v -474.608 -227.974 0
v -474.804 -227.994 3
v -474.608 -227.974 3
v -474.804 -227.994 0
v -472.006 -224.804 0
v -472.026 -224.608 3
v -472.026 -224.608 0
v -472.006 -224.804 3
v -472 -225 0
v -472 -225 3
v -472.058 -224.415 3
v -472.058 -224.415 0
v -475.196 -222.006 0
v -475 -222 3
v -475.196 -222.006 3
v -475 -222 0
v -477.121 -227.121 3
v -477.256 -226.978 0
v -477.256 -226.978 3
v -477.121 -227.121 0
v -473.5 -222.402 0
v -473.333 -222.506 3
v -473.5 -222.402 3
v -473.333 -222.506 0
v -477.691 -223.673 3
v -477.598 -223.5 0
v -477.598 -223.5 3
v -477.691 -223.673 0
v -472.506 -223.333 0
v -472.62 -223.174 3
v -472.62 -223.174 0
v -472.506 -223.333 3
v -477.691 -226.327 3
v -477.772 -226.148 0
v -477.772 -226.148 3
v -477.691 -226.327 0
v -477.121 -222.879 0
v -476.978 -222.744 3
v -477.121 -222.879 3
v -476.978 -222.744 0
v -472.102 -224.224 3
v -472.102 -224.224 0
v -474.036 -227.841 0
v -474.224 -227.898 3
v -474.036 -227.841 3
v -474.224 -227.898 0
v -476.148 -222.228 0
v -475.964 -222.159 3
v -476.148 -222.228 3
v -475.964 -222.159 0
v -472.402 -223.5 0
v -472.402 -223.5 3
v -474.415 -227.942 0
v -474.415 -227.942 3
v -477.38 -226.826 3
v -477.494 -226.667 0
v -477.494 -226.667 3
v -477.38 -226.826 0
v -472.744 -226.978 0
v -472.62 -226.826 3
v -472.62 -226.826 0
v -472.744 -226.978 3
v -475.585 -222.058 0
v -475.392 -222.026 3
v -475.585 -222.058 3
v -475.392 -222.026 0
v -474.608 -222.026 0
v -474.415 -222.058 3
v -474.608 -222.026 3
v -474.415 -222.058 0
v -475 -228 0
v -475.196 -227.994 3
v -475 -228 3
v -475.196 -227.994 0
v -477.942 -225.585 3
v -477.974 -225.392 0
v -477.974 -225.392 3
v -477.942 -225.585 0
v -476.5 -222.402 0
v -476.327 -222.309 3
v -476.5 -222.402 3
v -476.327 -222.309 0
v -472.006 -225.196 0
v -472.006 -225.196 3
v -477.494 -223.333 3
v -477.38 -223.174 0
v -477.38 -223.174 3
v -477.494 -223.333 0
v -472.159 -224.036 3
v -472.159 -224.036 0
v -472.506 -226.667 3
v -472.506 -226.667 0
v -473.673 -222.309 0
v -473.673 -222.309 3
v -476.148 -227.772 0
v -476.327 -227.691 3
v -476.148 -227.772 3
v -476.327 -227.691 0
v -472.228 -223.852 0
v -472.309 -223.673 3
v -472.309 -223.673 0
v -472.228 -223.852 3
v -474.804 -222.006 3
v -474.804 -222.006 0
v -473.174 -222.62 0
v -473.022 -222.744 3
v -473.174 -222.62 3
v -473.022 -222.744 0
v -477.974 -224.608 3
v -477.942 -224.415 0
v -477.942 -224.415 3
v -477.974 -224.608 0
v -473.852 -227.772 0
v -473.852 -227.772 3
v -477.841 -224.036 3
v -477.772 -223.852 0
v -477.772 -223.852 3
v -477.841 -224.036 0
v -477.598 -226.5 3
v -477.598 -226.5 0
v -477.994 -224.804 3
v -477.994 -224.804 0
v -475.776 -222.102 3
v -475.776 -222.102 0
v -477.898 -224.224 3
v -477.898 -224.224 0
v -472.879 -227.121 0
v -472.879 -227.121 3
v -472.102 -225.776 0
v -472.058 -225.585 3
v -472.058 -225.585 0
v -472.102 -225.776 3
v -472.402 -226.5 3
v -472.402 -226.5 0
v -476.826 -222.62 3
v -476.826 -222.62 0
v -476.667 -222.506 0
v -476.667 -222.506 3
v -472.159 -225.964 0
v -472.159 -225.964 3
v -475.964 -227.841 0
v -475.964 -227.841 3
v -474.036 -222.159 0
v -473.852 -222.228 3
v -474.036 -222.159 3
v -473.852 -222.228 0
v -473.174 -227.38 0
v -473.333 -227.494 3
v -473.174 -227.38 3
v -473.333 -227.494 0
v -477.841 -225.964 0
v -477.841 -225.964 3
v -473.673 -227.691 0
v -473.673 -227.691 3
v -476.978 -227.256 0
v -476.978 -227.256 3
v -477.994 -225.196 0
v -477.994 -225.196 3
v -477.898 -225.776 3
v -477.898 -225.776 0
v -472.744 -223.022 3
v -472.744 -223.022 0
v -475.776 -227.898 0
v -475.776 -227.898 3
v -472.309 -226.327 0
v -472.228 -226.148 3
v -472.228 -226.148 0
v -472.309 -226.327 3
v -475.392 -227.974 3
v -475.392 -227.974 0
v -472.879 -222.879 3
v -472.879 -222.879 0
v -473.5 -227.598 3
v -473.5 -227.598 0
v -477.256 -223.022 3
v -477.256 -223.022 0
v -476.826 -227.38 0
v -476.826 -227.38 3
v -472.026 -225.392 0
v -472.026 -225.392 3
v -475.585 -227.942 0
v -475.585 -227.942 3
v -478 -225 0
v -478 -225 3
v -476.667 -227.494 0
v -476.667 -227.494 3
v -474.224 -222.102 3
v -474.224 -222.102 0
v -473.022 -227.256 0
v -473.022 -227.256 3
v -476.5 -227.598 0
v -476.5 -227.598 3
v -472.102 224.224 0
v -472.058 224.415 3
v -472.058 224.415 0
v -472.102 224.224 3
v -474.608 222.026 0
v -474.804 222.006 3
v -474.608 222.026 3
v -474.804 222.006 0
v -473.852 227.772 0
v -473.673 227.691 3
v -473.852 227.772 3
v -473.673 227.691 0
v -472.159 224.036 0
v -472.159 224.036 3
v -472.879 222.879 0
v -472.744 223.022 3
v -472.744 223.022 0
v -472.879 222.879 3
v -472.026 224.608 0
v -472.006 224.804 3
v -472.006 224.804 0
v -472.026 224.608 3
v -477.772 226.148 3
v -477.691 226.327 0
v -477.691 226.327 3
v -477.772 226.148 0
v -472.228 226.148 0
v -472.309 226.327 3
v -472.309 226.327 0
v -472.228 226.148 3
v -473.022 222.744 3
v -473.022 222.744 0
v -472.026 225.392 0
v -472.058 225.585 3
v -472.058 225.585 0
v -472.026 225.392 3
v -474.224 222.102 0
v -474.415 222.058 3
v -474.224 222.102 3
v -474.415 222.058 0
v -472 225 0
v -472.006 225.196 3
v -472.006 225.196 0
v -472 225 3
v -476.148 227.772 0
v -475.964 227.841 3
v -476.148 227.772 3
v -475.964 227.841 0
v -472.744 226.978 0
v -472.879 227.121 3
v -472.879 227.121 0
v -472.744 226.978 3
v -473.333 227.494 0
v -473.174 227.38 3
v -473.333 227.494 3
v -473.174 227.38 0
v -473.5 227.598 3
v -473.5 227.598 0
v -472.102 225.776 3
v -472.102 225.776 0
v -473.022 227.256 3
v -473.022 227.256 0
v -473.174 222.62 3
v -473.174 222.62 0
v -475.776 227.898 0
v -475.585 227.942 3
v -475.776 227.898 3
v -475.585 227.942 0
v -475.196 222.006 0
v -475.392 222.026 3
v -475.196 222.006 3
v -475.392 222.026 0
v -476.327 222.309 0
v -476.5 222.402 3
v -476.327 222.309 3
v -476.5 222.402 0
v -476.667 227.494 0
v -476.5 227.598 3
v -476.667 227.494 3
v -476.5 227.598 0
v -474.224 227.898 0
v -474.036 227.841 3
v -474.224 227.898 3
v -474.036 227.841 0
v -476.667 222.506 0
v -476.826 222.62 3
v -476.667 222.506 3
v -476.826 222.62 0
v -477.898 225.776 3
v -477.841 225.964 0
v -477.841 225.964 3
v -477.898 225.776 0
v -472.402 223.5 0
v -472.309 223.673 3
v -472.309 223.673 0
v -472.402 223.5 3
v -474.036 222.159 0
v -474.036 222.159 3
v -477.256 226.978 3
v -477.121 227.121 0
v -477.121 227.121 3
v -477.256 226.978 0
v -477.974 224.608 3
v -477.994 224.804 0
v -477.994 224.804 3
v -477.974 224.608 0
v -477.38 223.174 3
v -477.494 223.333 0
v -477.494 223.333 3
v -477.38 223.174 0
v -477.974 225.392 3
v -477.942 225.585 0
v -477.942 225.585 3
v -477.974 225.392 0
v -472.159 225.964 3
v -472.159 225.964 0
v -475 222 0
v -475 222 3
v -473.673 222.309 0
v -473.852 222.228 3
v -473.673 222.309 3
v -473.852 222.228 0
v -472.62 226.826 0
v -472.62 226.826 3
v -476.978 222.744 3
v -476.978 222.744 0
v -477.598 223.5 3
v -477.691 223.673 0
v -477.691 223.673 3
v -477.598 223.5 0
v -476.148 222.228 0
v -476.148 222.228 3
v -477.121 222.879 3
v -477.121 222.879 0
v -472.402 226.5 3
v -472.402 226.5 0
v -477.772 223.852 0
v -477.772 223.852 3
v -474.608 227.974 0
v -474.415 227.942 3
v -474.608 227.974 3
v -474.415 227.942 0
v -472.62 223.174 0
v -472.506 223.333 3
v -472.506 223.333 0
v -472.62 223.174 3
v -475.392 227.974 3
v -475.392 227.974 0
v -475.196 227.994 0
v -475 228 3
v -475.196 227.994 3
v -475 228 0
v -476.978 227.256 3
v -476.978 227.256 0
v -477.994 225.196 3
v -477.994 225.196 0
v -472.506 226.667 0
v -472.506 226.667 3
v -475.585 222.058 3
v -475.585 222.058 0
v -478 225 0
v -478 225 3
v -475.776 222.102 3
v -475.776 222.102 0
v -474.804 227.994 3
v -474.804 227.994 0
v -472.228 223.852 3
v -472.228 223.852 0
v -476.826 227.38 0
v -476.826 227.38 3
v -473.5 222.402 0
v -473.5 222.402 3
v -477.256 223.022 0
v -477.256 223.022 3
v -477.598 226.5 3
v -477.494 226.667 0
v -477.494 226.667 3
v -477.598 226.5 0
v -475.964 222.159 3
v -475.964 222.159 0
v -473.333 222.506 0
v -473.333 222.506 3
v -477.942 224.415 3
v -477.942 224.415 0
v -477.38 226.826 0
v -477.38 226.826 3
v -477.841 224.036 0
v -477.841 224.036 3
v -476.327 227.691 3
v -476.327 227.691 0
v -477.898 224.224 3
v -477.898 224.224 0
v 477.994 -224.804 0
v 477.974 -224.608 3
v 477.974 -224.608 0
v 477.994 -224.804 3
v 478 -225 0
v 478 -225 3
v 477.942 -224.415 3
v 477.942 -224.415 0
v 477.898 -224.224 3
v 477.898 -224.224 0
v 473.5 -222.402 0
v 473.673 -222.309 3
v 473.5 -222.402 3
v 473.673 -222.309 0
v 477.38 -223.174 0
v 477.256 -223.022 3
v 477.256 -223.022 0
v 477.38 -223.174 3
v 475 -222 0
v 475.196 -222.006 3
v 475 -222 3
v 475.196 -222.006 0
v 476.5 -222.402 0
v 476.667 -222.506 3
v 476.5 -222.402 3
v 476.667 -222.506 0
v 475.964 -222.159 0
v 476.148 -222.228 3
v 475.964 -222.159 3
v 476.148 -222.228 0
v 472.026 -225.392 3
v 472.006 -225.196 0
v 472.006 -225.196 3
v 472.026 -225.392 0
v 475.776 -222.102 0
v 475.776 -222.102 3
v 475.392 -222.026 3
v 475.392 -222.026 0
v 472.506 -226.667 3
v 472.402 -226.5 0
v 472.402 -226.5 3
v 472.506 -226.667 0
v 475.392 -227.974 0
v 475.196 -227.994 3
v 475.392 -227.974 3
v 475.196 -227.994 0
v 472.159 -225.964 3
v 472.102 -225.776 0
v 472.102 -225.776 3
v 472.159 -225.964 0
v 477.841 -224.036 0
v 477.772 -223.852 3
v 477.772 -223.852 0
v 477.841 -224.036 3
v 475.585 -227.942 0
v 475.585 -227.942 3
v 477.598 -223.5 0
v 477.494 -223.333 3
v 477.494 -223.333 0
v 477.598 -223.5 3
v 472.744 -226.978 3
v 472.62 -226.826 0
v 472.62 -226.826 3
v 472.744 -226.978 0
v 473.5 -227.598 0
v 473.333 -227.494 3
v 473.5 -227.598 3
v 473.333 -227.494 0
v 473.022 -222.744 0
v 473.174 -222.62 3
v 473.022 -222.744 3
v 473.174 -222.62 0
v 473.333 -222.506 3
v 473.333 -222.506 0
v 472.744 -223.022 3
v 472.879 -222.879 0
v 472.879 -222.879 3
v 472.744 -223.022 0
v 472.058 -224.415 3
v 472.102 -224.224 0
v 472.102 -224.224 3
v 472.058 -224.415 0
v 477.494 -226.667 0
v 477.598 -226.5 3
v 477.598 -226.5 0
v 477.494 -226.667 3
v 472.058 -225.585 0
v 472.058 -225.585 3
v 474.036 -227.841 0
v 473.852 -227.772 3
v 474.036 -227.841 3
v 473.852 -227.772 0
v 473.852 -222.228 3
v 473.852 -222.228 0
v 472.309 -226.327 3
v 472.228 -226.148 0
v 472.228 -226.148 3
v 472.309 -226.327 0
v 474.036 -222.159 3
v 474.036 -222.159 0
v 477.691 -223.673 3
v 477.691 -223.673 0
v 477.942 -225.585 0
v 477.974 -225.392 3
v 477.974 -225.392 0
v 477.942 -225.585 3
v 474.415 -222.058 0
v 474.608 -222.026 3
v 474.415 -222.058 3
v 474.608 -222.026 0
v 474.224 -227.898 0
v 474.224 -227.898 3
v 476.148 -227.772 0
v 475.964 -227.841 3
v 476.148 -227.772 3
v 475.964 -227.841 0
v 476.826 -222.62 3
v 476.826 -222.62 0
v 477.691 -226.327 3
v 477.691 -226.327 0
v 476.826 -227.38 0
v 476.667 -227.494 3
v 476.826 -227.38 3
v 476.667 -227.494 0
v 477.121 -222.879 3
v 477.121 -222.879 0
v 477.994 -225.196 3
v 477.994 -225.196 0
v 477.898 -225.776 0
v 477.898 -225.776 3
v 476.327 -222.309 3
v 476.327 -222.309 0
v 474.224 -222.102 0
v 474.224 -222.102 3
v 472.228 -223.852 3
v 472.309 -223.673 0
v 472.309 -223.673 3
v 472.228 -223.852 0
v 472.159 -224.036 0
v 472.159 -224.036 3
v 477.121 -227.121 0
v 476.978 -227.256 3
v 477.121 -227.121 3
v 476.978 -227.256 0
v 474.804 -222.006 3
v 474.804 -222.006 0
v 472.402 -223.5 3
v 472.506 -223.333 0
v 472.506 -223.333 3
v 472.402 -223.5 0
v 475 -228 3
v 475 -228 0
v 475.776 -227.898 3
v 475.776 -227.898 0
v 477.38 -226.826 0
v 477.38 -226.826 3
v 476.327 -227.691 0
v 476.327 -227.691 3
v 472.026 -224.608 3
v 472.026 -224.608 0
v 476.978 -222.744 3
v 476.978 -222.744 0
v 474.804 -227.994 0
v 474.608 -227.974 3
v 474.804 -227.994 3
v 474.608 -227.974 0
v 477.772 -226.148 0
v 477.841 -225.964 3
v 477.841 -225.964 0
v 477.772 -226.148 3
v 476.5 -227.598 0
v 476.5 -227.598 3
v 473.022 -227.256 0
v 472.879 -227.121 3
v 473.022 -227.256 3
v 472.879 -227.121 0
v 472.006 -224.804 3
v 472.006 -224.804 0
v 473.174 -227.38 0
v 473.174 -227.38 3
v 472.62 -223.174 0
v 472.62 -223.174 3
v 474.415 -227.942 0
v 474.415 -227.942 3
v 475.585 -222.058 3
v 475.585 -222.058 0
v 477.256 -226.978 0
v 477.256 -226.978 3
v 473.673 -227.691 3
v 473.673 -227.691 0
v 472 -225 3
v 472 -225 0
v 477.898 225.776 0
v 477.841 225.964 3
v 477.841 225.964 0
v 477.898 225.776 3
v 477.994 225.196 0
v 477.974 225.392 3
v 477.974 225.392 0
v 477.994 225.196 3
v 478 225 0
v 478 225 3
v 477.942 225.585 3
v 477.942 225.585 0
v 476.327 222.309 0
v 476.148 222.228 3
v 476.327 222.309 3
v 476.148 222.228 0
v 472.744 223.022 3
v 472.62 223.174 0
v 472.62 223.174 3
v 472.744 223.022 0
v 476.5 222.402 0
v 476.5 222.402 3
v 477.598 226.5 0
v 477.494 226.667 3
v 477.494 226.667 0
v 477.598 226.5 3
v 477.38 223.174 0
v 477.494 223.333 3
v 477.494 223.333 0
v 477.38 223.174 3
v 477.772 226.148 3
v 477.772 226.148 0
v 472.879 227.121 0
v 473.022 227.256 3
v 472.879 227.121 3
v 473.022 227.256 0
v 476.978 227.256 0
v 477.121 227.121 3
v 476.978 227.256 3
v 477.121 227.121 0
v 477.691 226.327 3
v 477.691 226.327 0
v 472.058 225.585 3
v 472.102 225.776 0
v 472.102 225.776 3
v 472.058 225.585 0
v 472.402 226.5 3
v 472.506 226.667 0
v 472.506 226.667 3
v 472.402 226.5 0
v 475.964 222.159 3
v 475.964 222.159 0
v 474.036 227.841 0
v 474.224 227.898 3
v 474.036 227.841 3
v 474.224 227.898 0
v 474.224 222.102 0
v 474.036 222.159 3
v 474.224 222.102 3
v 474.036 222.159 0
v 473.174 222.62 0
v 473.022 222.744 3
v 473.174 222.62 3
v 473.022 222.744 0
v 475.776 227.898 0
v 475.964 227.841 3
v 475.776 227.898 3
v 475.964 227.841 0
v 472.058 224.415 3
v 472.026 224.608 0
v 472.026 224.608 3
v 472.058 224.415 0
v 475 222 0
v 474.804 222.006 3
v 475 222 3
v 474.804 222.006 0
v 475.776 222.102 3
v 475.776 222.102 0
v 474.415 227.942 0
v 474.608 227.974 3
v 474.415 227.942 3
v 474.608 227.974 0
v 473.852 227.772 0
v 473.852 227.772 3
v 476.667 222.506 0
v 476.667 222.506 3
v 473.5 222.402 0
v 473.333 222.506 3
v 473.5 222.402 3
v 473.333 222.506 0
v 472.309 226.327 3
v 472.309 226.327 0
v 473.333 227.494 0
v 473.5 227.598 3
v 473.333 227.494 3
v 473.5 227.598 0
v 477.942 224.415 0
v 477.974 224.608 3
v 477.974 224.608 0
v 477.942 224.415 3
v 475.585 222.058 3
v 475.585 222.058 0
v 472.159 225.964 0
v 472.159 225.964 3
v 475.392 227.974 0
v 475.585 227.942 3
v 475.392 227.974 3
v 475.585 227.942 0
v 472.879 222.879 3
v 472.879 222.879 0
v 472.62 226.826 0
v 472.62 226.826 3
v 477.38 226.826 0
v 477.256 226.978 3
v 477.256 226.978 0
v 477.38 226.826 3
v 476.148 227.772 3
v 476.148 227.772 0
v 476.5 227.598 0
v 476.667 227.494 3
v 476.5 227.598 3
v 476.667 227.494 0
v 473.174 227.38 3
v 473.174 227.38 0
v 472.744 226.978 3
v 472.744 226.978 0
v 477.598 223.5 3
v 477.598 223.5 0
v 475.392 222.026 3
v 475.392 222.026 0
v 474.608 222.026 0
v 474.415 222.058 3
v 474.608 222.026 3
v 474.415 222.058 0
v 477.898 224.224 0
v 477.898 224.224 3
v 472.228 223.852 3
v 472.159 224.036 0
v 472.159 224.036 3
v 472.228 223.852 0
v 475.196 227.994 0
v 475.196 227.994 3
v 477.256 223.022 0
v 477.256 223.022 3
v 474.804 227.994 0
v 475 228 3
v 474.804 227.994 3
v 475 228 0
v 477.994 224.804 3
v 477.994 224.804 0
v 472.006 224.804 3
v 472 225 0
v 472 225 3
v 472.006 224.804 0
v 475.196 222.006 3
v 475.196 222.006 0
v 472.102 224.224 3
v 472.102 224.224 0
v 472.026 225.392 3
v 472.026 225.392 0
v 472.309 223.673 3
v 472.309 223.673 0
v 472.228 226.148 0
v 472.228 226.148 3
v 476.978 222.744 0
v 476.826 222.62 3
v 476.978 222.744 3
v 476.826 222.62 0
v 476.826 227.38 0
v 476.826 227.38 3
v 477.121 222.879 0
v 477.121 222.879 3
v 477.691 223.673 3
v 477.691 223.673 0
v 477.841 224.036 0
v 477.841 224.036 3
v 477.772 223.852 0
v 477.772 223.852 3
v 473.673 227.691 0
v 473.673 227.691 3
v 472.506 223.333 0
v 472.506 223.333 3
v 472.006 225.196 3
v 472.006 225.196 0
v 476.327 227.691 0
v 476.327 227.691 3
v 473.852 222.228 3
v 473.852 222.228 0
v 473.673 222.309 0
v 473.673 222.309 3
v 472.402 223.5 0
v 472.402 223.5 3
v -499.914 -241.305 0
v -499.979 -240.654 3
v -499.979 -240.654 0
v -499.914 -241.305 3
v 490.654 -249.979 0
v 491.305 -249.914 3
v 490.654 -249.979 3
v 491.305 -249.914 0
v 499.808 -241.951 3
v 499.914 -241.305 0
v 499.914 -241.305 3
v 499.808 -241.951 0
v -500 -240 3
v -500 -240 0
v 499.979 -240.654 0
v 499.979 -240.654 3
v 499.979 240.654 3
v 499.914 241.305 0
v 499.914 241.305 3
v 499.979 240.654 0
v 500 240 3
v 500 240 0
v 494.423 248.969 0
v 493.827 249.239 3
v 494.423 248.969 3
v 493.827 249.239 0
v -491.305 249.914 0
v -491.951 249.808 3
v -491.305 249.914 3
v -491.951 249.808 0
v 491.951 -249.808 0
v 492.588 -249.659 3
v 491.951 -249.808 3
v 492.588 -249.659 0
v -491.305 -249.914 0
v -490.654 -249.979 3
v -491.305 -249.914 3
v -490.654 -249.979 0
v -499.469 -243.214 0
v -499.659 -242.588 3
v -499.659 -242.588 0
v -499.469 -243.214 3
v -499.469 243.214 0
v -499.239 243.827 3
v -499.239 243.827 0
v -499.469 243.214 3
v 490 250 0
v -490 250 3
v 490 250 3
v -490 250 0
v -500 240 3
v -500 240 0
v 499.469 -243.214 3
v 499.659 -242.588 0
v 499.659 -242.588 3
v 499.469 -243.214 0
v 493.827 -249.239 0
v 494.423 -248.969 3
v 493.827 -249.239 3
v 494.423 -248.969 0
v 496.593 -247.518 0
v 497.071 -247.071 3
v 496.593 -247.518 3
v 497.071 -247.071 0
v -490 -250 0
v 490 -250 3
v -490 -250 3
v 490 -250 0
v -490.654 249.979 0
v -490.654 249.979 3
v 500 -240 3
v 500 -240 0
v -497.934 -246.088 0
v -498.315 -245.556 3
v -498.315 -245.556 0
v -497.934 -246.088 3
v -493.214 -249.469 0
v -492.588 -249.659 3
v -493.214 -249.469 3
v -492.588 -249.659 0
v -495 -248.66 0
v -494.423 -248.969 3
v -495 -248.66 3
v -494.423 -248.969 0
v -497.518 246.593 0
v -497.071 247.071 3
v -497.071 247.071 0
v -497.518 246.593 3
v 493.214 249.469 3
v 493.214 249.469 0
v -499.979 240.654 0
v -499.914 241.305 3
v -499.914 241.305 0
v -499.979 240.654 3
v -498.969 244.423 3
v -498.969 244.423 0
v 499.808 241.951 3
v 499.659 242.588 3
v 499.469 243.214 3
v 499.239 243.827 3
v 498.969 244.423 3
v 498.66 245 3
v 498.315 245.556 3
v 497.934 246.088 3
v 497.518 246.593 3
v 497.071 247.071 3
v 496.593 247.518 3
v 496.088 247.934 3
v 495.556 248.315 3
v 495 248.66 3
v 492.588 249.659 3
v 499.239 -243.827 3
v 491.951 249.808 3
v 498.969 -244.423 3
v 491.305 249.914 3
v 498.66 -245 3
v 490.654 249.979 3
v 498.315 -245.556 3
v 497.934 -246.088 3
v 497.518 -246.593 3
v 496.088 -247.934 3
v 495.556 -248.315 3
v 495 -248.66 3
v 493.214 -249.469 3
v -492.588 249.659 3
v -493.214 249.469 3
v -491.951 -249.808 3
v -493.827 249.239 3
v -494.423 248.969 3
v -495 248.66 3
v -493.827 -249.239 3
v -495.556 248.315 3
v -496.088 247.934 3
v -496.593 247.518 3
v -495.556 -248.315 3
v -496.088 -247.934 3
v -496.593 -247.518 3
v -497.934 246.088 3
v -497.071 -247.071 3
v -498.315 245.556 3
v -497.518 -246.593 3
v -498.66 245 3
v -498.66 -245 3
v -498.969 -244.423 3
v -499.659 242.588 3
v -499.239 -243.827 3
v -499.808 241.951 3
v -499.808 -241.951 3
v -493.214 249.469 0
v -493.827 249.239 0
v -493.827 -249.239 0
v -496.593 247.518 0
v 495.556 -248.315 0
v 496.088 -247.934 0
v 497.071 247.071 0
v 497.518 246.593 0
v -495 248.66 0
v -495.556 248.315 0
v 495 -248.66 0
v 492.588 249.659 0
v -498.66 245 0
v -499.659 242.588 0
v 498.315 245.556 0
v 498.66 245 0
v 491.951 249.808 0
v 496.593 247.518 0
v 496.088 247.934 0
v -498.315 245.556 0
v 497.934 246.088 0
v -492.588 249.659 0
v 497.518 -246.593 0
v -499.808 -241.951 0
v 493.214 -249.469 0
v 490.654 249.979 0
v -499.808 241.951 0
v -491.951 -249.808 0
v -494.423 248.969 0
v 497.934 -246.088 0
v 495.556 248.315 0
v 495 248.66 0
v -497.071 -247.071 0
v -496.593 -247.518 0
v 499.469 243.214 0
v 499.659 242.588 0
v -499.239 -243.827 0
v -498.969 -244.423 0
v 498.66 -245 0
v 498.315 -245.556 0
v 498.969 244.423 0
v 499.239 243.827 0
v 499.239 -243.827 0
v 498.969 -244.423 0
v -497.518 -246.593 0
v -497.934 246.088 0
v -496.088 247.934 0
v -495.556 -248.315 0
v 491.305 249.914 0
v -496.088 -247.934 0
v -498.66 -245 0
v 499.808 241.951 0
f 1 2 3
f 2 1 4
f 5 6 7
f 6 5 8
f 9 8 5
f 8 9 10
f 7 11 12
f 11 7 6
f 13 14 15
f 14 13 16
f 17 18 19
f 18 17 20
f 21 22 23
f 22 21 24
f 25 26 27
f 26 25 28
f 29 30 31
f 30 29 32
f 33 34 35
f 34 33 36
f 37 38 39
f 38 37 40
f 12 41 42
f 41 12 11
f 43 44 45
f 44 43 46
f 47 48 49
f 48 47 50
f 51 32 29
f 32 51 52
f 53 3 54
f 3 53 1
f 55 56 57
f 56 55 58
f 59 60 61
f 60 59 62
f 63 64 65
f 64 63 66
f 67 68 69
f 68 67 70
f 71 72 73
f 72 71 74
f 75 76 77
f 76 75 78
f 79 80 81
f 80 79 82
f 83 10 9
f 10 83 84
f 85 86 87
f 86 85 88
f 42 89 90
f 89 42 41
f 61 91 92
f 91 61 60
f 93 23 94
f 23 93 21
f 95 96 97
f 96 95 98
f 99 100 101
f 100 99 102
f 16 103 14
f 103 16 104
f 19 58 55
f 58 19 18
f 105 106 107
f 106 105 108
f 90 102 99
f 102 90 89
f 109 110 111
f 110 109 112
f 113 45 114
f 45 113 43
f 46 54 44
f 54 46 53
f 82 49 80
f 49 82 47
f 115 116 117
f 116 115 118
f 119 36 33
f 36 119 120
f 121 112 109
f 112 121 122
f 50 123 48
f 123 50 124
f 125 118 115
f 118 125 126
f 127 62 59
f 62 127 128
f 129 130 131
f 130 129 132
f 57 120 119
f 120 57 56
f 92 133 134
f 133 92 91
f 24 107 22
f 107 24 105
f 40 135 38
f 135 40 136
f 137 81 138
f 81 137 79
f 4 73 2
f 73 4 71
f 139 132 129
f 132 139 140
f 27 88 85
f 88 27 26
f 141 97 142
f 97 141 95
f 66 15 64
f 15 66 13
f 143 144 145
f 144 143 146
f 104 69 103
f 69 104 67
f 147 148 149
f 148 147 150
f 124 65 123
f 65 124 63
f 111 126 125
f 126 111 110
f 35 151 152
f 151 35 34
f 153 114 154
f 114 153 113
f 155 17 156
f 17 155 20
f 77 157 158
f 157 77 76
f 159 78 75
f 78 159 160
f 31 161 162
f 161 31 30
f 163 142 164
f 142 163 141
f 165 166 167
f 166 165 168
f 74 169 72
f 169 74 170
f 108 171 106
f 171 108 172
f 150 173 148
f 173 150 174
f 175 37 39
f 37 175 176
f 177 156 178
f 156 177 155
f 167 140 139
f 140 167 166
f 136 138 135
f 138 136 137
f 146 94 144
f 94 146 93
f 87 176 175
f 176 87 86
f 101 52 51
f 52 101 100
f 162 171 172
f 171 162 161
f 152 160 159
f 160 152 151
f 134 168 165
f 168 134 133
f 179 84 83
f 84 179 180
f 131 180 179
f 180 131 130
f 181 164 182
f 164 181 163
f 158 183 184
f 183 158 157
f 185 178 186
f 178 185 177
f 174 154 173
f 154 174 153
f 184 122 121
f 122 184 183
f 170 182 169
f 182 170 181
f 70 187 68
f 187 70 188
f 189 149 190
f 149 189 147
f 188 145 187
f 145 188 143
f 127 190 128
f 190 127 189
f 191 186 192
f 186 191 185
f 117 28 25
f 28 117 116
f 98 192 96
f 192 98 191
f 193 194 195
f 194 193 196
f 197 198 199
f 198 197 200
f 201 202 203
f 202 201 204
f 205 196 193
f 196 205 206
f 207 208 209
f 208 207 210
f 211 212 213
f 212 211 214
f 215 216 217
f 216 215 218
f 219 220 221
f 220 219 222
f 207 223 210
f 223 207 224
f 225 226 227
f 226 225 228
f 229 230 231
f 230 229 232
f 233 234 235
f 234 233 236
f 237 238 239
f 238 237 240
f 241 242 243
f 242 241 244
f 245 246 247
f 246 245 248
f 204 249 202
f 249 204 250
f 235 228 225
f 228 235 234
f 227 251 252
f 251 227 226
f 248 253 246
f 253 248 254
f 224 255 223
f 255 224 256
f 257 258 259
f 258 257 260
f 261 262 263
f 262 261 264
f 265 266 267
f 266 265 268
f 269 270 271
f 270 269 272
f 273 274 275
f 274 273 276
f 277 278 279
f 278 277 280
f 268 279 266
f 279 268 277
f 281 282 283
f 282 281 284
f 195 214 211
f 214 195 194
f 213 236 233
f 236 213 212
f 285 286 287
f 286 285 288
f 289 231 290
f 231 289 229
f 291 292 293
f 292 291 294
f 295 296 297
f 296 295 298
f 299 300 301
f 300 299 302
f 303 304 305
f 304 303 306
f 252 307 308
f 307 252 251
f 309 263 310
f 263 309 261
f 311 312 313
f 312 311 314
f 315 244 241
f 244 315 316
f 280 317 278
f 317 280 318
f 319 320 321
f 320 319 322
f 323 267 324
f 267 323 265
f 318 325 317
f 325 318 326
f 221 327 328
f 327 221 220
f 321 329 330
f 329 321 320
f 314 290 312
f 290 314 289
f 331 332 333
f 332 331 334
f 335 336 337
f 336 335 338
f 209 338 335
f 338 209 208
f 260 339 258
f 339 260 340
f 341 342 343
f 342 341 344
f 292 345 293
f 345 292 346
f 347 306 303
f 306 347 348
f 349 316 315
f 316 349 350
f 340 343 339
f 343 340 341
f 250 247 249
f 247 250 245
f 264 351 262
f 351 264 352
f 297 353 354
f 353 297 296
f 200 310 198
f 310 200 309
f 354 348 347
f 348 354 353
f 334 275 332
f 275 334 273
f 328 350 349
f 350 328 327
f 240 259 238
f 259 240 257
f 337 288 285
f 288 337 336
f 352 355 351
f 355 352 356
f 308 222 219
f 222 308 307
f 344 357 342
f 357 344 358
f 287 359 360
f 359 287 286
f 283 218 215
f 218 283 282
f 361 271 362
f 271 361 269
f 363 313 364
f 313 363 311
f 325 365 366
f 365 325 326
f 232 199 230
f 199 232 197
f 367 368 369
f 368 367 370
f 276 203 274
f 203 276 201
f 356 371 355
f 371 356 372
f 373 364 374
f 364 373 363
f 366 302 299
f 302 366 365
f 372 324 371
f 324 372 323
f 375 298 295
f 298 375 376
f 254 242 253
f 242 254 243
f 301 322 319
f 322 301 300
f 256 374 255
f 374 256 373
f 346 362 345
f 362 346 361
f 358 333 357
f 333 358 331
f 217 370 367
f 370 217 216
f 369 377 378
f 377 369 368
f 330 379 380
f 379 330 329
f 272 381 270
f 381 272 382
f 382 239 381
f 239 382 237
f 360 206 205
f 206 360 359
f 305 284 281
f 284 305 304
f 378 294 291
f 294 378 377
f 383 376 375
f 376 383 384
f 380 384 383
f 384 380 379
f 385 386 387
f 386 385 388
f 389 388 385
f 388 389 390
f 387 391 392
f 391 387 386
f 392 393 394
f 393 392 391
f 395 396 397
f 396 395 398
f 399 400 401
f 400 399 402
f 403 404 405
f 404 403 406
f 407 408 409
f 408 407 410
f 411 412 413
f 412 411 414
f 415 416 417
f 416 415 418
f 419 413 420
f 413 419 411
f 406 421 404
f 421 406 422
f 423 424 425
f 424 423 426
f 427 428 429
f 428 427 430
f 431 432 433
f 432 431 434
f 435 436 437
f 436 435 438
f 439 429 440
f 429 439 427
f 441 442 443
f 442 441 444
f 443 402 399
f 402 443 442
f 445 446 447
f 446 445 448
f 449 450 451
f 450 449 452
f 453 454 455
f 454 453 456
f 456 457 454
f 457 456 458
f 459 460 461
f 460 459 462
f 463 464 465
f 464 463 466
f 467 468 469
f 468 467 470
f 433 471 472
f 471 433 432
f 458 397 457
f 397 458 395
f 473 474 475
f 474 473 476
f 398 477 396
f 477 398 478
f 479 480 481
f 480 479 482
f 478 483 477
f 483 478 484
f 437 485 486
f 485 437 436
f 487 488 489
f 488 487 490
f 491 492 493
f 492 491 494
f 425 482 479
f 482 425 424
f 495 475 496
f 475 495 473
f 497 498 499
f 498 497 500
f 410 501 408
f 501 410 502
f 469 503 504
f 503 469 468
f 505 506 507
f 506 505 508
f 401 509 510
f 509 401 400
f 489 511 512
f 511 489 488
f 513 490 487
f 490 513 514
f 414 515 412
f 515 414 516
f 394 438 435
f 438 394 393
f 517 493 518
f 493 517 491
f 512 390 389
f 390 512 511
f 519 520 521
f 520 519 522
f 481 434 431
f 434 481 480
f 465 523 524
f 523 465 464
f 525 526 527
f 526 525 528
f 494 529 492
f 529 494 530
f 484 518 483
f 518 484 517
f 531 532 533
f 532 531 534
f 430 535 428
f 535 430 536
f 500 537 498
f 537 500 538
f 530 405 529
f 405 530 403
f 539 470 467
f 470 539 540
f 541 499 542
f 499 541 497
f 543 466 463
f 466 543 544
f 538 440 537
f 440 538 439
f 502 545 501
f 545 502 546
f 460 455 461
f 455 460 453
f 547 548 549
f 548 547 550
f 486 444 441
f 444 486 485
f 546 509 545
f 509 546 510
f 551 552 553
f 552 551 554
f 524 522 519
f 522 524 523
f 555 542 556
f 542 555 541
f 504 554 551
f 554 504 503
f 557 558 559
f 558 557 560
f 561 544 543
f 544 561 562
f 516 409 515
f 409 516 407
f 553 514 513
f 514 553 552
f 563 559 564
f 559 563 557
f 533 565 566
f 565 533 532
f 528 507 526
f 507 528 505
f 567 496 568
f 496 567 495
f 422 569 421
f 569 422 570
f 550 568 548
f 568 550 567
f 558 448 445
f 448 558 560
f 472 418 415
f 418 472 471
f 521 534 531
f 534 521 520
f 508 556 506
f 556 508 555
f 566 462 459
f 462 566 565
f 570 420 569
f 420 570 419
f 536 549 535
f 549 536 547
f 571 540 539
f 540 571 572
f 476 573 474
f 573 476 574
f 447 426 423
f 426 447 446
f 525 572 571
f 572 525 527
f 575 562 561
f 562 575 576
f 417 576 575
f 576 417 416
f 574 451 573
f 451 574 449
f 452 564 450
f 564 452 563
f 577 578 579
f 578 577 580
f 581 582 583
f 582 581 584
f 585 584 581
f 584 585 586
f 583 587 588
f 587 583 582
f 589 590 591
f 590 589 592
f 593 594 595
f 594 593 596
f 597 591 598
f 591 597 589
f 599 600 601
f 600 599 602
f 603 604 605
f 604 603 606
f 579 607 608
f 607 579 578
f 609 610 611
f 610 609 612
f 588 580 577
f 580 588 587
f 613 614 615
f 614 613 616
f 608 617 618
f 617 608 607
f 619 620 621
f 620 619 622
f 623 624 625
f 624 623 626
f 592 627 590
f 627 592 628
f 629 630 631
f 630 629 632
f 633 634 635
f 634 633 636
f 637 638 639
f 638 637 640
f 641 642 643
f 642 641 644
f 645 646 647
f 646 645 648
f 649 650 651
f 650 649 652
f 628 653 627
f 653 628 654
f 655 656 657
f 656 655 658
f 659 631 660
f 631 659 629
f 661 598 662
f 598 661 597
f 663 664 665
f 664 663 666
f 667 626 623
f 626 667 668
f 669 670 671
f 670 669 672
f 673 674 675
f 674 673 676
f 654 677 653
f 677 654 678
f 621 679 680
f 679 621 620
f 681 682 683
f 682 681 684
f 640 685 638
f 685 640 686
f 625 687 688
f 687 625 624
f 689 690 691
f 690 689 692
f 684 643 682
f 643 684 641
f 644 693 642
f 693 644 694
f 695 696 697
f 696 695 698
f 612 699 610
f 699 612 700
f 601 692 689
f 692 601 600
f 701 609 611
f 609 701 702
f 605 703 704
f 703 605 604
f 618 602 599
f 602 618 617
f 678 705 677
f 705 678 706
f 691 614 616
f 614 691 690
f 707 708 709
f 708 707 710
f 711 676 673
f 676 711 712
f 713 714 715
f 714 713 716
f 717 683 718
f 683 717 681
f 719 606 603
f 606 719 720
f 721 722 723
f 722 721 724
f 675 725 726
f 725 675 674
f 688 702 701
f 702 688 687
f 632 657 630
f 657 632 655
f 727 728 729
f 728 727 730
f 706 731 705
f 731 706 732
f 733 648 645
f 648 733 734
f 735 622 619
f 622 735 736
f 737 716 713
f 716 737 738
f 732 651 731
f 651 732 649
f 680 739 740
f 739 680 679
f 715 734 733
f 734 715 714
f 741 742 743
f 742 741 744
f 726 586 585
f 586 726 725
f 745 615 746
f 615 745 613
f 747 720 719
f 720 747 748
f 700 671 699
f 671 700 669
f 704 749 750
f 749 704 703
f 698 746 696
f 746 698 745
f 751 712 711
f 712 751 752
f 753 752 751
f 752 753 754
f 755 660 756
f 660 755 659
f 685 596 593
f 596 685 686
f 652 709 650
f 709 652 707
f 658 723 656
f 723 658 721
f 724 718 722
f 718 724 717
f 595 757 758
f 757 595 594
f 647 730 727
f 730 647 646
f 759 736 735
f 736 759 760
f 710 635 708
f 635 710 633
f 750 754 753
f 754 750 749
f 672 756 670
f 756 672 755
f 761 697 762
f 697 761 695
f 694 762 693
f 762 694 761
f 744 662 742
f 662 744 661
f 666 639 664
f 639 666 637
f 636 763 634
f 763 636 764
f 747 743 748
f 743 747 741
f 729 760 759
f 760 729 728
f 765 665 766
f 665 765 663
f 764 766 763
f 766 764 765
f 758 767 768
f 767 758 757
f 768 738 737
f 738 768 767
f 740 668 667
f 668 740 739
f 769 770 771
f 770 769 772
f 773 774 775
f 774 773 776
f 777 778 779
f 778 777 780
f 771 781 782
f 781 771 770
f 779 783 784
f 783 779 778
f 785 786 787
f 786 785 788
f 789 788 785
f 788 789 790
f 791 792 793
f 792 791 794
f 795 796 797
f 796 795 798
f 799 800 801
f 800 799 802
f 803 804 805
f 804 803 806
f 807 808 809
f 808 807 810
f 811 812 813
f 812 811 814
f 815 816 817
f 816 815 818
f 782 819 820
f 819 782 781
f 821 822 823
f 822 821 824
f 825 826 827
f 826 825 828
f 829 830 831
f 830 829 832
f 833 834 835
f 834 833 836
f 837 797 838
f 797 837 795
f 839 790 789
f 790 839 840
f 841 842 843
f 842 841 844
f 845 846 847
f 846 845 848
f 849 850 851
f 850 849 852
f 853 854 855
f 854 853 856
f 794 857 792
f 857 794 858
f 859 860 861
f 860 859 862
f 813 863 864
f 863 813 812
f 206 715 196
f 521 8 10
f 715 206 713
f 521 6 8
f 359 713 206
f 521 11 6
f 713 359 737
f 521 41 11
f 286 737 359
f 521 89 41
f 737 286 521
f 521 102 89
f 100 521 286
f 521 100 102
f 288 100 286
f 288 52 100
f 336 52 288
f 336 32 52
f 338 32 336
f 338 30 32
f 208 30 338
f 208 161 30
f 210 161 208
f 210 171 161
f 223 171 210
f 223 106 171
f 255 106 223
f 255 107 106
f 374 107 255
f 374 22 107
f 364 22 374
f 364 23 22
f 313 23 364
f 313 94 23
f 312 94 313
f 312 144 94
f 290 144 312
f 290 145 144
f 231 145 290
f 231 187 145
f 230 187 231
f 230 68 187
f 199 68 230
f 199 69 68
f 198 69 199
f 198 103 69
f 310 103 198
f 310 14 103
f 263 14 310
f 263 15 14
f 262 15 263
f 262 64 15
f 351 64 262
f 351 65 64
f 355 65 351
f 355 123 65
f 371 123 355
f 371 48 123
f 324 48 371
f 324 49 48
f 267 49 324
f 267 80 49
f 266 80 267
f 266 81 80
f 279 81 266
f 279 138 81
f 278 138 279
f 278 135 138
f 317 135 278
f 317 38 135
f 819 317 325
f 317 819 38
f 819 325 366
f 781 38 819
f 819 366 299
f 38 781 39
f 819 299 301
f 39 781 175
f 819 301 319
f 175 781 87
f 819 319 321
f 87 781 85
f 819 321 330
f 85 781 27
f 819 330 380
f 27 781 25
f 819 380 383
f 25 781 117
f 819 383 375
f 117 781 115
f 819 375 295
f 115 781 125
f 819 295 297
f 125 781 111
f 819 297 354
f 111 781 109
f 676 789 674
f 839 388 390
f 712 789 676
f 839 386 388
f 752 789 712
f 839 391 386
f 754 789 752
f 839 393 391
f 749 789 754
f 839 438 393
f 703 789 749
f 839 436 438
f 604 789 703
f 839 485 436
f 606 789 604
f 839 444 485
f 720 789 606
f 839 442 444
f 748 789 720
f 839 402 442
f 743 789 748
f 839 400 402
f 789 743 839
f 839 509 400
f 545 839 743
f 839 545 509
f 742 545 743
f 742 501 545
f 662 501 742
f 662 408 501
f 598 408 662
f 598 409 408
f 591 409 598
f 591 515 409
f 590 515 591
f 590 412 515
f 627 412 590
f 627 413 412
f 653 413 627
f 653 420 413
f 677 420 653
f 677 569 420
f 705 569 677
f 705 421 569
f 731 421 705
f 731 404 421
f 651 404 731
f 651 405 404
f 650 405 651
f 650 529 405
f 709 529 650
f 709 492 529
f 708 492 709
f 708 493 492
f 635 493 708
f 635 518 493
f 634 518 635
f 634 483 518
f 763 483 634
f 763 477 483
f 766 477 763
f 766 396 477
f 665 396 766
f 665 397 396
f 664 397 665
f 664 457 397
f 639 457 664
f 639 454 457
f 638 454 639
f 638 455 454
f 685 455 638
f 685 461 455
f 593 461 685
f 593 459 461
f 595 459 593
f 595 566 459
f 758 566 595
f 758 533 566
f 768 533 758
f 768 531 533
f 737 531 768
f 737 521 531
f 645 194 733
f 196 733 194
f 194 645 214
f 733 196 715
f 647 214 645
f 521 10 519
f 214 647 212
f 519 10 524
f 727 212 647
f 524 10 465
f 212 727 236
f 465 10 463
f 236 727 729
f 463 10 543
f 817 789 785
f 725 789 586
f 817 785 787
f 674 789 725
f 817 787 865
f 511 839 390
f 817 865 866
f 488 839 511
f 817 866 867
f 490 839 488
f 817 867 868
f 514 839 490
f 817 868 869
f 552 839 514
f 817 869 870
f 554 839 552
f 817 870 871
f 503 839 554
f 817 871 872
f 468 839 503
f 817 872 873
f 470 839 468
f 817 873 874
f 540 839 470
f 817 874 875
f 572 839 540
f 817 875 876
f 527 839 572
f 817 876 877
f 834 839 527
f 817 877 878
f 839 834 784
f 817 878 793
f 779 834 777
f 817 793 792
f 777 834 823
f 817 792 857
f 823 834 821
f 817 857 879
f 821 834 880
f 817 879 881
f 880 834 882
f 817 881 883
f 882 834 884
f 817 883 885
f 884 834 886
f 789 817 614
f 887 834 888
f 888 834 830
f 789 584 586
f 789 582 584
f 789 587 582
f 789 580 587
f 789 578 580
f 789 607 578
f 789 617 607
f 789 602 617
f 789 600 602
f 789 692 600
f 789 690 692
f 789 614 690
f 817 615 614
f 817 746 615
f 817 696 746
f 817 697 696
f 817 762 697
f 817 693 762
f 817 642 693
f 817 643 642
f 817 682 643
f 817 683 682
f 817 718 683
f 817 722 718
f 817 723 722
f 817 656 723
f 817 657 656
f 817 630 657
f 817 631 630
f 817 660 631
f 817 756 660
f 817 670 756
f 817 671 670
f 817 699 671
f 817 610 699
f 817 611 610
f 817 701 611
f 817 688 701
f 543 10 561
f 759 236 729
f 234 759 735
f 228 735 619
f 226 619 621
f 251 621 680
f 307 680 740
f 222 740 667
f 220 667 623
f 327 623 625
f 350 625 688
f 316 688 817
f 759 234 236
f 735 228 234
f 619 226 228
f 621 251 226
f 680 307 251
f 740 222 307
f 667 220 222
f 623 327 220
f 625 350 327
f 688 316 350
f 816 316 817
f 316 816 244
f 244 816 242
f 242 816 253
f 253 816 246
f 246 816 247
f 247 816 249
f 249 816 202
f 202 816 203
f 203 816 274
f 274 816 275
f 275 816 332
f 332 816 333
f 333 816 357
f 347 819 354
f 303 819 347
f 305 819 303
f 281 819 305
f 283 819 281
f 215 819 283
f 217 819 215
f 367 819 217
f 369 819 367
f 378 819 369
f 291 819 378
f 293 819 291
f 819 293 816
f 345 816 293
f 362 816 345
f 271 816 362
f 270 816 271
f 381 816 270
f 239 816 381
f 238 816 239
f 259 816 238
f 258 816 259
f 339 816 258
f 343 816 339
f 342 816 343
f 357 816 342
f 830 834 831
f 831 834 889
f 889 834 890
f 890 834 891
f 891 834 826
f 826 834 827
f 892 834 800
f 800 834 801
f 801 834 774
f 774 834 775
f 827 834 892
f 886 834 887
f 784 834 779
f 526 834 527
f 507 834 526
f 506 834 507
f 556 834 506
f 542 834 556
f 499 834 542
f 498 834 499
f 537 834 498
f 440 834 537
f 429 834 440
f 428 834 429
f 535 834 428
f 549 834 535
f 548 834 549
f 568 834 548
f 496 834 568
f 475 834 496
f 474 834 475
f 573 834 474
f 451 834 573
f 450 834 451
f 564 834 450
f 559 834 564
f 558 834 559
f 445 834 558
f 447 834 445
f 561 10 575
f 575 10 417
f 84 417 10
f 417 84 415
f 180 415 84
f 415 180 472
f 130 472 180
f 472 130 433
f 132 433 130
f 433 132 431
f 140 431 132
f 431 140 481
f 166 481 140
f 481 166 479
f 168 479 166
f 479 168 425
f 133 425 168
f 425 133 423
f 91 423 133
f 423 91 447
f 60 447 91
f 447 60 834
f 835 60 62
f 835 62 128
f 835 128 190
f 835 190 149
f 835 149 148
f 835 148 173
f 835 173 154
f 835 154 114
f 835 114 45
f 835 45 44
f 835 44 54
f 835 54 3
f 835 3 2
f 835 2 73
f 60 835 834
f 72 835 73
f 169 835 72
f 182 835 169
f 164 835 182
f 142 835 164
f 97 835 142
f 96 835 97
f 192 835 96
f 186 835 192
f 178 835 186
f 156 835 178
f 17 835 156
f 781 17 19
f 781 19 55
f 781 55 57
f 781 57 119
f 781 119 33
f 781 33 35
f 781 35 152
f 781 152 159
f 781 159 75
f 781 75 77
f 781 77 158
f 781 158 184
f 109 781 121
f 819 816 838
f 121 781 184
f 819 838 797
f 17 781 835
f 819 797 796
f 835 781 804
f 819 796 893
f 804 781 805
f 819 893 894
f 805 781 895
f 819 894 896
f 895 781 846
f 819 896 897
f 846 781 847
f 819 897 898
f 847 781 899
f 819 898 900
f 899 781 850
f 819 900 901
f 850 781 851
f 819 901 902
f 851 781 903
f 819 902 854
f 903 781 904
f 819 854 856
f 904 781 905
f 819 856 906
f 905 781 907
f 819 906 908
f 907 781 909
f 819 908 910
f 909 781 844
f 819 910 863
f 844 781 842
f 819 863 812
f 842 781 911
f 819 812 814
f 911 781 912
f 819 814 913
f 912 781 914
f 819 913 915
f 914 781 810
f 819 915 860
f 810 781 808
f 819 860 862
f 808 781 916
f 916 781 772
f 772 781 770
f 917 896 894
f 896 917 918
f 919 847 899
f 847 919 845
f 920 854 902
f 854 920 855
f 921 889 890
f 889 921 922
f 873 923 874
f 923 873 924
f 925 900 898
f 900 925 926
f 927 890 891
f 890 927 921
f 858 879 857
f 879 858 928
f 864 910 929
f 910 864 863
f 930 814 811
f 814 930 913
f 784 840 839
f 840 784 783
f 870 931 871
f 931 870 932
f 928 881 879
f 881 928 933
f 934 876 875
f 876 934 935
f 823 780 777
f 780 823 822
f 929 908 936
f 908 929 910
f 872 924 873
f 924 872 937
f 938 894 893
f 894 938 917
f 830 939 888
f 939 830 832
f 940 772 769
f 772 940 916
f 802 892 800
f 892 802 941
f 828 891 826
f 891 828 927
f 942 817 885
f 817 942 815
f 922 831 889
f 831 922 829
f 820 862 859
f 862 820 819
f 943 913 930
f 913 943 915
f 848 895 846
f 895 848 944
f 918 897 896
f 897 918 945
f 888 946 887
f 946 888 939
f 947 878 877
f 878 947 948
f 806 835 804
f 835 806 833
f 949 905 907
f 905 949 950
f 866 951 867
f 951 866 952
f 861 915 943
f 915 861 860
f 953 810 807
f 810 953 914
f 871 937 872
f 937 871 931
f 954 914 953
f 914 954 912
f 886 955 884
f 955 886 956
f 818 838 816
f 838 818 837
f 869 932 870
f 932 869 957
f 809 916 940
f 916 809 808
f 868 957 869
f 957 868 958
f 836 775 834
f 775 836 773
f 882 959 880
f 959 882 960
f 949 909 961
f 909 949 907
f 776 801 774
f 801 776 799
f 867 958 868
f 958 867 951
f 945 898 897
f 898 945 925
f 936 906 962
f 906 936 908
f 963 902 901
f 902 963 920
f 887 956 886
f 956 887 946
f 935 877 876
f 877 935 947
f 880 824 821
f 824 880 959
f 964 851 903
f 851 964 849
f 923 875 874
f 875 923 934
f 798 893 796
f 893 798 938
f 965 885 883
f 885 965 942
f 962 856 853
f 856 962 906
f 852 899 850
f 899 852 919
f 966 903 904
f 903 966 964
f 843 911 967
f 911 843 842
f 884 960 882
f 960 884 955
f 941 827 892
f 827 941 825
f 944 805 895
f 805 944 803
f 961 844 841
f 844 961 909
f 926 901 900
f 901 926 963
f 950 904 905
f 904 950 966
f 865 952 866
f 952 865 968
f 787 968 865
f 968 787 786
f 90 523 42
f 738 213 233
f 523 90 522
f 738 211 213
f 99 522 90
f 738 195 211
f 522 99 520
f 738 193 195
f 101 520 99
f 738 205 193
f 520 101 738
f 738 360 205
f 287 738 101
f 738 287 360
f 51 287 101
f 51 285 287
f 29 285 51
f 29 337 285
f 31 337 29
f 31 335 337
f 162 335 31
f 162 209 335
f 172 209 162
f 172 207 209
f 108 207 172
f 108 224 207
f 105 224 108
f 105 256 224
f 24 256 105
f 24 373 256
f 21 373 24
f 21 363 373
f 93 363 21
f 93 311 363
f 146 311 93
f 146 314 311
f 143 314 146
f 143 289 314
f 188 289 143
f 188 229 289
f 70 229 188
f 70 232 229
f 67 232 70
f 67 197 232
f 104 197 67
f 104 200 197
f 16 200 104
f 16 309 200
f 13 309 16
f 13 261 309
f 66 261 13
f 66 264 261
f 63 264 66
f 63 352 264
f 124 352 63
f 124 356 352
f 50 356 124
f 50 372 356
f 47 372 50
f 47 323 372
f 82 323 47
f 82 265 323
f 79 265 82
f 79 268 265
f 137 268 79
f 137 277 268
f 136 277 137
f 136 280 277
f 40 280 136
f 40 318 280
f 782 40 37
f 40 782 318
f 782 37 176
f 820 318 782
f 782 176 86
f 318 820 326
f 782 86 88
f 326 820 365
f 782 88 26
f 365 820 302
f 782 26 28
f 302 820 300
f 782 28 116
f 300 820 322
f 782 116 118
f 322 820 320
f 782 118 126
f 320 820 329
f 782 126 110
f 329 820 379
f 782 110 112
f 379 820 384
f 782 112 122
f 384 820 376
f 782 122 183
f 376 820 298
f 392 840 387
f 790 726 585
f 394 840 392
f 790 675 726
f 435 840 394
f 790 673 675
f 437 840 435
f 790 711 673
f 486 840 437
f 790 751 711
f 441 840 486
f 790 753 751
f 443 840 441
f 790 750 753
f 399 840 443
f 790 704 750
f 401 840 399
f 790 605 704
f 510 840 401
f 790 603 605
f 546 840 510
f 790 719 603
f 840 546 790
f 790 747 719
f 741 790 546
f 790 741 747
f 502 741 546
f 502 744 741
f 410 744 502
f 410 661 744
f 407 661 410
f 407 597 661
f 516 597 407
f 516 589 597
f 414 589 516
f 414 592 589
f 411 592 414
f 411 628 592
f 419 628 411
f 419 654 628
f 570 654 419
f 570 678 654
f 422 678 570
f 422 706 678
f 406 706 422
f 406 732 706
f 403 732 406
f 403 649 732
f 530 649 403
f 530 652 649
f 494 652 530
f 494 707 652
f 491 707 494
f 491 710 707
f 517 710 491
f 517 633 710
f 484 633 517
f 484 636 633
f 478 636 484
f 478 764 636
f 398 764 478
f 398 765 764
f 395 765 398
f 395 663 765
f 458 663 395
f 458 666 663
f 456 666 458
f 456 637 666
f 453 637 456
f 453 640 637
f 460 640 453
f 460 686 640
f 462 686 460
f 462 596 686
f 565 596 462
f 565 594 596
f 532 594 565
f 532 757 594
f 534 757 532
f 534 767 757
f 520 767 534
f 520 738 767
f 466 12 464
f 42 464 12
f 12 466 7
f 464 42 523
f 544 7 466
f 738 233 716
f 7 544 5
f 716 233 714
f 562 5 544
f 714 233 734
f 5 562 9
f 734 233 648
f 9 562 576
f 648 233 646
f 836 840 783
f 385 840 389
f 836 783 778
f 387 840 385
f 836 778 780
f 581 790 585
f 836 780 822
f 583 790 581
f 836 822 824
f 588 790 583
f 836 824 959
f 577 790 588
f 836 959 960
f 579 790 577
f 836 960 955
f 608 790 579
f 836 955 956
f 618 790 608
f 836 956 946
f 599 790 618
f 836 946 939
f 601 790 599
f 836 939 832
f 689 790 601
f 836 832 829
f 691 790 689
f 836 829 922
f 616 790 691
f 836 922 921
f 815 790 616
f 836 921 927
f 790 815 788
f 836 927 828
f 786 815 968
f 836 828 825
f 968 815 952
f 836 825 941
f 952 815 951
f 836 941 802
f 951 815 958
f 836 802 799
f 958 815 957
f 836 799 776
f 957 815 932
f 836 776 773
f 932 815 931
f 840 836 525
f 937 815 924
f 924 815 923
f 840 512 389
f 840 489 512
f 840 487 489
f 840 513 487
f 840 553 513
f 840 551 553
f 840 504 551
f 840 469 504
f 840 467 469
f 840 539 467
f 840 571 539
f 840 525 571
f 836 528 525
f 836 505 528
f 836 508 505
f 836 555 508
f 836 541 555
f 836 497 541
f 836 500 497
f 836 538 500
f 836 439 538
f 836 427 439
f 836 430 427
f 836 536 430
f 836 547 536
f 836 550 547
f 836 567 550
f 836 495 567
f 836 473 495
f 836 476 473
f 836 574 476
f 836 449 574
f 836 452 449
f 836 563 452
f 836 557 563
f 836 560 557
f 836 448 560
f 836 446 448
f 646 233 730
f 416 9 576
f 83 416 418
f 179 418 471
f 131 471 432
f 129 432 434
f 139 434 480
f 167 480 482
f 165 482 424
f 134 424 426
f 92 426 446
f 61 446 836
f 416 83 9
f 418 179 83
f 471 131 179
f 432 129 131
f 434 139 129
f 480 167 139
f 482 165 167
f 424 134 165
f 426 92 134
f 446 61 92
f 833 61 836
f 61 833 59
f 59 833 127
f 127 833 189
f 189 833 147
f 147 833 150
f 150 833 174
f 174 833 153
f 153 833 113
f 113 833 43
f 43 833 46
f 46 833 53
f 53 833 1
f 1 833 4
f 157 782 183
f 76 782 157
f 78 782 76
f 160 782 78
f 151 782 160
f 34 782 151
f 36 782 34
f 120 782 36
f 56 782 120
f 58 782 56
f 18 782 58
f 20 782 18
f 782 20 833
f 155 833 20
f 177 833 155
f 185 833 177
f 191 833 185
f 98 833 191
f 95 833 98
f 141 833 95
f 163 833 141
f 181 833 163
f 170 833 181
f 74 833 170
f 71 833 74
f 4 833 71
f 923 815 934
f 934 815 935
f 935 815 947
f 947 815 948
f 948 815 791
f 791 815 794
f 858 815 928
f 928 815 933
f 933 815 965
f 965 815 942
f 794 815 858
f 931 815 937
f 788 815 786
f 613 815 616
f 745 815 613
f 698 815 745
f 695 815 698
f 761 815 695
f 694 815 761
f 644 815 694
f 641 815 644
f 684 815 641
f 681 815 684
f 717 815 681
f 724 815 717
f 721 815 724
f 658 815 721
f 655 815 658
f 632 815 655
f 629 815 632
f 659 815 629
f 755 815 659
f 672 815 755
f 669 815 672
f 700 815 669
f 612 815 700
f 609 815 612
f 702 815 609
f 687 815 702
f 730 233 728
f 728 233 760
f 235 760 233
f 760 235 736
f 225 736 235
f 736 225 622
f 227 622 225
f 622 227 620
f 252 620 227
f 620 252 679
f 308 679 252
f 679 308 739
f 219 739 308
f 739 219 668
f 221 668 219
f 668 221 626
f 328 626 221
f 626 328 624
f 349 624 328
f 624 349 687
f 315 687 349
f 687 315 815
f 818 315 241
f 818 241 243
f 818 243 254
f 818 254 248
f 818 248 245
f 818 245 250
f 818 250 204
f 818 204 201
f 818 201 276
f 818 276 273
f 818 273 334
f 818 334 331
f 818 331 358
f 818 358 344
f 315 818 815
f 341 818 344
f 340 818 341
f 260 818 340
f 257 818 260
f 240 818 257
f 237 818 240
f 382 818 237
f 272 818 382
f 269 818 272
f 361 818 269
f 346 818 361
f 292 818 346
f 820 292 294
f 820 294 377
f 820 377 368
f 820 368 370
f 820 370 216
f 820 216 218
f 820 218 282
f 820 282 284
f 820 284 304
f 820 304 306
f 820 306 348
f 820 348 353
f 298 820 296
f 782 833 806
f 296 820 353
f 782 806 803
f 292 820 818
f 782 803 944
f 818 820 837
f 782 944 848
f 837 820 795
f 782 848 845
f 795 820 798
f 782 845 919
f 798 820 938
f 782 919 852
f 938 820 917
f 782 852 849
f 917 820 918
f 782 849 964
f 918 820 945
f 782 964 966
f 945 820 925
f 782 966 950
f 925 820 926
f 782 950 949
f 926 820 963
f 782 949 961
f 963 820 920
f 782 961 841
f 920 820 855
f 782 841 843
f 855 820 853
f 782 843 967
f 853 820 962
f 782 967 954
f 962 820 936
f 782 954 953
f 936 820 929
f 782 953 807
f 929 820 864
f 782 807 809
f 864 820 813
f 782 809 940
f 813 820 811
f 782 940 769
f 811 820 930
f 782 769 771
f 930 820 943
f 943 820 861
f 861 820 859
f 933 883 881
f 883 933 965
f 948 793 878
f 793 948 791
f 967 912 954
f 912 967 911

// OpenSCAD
// Sheet DiBond - single connected solid with rounded corners and mounting holes

// Parameters
sheet_length = 1000; //[500:2000:1]
sheet_width = 500;   //[250:1000:1]
sheet_thickness = 3; //[1.5:6:0.1]
corner_radius = 10;  //[2:25:1]
hole_diameter = 6;   //[3:12:0.5]
hole_edge_offset = 25; //[10:80:1]

// Robustness / connectivity
eps = 0.05;          // small overlap to avoid coplanar artifacts
$fn = 96;

// Helpers
function clamp(v, lo, hi) = v < lo ? lo : (v > hi ? hi : v);

// Keep features valid
r = clamp(corner_radius, 0, min(sheet_length, sheet_width)/2 - eps);
hole_off = clamp(
    hole_edge_offset,
    hole_diameter/2 + eps,
    min(sheet_length, sheet_width)/2 - r - eps
);

// 2D rounded rectangle (centered)
module rounded_rect_2d(L, W, R) {
    if (R <= 0)
        square([L, W], center=true);
    else
        hull() {
            for (sx = [-1, 1], sy = [-1, 1])
                translate([sx*(L/2 - R), sy*(W/2 - R)])
                    circle(r=R);
        }
}

// Main sheet with holes (single solid)
module sheet_dibond() {
    difference() {
        // Use center=false so Z spans [0..thickness] (avoids "blank" renders in some pipelines)
        linear_extrude(height=sheet_thickness, center=false, convexity=20)
            rounded_rect_2d(sheet_length, sheet_width, r);

        // Mounting holes (through), slightly longer than thickness for clean subtraction
        for (sx = [-1, 1], sy = [-1, 1])
            translate([sx*(sheet_length/2 - hole_off), sy*(sheet_width/2 - hole_off), -eps])
                cylinder(h=sheet_thickness + 2*eps, r=hole_diameter/2, center=false);
    }
}

sheet_dibond();
